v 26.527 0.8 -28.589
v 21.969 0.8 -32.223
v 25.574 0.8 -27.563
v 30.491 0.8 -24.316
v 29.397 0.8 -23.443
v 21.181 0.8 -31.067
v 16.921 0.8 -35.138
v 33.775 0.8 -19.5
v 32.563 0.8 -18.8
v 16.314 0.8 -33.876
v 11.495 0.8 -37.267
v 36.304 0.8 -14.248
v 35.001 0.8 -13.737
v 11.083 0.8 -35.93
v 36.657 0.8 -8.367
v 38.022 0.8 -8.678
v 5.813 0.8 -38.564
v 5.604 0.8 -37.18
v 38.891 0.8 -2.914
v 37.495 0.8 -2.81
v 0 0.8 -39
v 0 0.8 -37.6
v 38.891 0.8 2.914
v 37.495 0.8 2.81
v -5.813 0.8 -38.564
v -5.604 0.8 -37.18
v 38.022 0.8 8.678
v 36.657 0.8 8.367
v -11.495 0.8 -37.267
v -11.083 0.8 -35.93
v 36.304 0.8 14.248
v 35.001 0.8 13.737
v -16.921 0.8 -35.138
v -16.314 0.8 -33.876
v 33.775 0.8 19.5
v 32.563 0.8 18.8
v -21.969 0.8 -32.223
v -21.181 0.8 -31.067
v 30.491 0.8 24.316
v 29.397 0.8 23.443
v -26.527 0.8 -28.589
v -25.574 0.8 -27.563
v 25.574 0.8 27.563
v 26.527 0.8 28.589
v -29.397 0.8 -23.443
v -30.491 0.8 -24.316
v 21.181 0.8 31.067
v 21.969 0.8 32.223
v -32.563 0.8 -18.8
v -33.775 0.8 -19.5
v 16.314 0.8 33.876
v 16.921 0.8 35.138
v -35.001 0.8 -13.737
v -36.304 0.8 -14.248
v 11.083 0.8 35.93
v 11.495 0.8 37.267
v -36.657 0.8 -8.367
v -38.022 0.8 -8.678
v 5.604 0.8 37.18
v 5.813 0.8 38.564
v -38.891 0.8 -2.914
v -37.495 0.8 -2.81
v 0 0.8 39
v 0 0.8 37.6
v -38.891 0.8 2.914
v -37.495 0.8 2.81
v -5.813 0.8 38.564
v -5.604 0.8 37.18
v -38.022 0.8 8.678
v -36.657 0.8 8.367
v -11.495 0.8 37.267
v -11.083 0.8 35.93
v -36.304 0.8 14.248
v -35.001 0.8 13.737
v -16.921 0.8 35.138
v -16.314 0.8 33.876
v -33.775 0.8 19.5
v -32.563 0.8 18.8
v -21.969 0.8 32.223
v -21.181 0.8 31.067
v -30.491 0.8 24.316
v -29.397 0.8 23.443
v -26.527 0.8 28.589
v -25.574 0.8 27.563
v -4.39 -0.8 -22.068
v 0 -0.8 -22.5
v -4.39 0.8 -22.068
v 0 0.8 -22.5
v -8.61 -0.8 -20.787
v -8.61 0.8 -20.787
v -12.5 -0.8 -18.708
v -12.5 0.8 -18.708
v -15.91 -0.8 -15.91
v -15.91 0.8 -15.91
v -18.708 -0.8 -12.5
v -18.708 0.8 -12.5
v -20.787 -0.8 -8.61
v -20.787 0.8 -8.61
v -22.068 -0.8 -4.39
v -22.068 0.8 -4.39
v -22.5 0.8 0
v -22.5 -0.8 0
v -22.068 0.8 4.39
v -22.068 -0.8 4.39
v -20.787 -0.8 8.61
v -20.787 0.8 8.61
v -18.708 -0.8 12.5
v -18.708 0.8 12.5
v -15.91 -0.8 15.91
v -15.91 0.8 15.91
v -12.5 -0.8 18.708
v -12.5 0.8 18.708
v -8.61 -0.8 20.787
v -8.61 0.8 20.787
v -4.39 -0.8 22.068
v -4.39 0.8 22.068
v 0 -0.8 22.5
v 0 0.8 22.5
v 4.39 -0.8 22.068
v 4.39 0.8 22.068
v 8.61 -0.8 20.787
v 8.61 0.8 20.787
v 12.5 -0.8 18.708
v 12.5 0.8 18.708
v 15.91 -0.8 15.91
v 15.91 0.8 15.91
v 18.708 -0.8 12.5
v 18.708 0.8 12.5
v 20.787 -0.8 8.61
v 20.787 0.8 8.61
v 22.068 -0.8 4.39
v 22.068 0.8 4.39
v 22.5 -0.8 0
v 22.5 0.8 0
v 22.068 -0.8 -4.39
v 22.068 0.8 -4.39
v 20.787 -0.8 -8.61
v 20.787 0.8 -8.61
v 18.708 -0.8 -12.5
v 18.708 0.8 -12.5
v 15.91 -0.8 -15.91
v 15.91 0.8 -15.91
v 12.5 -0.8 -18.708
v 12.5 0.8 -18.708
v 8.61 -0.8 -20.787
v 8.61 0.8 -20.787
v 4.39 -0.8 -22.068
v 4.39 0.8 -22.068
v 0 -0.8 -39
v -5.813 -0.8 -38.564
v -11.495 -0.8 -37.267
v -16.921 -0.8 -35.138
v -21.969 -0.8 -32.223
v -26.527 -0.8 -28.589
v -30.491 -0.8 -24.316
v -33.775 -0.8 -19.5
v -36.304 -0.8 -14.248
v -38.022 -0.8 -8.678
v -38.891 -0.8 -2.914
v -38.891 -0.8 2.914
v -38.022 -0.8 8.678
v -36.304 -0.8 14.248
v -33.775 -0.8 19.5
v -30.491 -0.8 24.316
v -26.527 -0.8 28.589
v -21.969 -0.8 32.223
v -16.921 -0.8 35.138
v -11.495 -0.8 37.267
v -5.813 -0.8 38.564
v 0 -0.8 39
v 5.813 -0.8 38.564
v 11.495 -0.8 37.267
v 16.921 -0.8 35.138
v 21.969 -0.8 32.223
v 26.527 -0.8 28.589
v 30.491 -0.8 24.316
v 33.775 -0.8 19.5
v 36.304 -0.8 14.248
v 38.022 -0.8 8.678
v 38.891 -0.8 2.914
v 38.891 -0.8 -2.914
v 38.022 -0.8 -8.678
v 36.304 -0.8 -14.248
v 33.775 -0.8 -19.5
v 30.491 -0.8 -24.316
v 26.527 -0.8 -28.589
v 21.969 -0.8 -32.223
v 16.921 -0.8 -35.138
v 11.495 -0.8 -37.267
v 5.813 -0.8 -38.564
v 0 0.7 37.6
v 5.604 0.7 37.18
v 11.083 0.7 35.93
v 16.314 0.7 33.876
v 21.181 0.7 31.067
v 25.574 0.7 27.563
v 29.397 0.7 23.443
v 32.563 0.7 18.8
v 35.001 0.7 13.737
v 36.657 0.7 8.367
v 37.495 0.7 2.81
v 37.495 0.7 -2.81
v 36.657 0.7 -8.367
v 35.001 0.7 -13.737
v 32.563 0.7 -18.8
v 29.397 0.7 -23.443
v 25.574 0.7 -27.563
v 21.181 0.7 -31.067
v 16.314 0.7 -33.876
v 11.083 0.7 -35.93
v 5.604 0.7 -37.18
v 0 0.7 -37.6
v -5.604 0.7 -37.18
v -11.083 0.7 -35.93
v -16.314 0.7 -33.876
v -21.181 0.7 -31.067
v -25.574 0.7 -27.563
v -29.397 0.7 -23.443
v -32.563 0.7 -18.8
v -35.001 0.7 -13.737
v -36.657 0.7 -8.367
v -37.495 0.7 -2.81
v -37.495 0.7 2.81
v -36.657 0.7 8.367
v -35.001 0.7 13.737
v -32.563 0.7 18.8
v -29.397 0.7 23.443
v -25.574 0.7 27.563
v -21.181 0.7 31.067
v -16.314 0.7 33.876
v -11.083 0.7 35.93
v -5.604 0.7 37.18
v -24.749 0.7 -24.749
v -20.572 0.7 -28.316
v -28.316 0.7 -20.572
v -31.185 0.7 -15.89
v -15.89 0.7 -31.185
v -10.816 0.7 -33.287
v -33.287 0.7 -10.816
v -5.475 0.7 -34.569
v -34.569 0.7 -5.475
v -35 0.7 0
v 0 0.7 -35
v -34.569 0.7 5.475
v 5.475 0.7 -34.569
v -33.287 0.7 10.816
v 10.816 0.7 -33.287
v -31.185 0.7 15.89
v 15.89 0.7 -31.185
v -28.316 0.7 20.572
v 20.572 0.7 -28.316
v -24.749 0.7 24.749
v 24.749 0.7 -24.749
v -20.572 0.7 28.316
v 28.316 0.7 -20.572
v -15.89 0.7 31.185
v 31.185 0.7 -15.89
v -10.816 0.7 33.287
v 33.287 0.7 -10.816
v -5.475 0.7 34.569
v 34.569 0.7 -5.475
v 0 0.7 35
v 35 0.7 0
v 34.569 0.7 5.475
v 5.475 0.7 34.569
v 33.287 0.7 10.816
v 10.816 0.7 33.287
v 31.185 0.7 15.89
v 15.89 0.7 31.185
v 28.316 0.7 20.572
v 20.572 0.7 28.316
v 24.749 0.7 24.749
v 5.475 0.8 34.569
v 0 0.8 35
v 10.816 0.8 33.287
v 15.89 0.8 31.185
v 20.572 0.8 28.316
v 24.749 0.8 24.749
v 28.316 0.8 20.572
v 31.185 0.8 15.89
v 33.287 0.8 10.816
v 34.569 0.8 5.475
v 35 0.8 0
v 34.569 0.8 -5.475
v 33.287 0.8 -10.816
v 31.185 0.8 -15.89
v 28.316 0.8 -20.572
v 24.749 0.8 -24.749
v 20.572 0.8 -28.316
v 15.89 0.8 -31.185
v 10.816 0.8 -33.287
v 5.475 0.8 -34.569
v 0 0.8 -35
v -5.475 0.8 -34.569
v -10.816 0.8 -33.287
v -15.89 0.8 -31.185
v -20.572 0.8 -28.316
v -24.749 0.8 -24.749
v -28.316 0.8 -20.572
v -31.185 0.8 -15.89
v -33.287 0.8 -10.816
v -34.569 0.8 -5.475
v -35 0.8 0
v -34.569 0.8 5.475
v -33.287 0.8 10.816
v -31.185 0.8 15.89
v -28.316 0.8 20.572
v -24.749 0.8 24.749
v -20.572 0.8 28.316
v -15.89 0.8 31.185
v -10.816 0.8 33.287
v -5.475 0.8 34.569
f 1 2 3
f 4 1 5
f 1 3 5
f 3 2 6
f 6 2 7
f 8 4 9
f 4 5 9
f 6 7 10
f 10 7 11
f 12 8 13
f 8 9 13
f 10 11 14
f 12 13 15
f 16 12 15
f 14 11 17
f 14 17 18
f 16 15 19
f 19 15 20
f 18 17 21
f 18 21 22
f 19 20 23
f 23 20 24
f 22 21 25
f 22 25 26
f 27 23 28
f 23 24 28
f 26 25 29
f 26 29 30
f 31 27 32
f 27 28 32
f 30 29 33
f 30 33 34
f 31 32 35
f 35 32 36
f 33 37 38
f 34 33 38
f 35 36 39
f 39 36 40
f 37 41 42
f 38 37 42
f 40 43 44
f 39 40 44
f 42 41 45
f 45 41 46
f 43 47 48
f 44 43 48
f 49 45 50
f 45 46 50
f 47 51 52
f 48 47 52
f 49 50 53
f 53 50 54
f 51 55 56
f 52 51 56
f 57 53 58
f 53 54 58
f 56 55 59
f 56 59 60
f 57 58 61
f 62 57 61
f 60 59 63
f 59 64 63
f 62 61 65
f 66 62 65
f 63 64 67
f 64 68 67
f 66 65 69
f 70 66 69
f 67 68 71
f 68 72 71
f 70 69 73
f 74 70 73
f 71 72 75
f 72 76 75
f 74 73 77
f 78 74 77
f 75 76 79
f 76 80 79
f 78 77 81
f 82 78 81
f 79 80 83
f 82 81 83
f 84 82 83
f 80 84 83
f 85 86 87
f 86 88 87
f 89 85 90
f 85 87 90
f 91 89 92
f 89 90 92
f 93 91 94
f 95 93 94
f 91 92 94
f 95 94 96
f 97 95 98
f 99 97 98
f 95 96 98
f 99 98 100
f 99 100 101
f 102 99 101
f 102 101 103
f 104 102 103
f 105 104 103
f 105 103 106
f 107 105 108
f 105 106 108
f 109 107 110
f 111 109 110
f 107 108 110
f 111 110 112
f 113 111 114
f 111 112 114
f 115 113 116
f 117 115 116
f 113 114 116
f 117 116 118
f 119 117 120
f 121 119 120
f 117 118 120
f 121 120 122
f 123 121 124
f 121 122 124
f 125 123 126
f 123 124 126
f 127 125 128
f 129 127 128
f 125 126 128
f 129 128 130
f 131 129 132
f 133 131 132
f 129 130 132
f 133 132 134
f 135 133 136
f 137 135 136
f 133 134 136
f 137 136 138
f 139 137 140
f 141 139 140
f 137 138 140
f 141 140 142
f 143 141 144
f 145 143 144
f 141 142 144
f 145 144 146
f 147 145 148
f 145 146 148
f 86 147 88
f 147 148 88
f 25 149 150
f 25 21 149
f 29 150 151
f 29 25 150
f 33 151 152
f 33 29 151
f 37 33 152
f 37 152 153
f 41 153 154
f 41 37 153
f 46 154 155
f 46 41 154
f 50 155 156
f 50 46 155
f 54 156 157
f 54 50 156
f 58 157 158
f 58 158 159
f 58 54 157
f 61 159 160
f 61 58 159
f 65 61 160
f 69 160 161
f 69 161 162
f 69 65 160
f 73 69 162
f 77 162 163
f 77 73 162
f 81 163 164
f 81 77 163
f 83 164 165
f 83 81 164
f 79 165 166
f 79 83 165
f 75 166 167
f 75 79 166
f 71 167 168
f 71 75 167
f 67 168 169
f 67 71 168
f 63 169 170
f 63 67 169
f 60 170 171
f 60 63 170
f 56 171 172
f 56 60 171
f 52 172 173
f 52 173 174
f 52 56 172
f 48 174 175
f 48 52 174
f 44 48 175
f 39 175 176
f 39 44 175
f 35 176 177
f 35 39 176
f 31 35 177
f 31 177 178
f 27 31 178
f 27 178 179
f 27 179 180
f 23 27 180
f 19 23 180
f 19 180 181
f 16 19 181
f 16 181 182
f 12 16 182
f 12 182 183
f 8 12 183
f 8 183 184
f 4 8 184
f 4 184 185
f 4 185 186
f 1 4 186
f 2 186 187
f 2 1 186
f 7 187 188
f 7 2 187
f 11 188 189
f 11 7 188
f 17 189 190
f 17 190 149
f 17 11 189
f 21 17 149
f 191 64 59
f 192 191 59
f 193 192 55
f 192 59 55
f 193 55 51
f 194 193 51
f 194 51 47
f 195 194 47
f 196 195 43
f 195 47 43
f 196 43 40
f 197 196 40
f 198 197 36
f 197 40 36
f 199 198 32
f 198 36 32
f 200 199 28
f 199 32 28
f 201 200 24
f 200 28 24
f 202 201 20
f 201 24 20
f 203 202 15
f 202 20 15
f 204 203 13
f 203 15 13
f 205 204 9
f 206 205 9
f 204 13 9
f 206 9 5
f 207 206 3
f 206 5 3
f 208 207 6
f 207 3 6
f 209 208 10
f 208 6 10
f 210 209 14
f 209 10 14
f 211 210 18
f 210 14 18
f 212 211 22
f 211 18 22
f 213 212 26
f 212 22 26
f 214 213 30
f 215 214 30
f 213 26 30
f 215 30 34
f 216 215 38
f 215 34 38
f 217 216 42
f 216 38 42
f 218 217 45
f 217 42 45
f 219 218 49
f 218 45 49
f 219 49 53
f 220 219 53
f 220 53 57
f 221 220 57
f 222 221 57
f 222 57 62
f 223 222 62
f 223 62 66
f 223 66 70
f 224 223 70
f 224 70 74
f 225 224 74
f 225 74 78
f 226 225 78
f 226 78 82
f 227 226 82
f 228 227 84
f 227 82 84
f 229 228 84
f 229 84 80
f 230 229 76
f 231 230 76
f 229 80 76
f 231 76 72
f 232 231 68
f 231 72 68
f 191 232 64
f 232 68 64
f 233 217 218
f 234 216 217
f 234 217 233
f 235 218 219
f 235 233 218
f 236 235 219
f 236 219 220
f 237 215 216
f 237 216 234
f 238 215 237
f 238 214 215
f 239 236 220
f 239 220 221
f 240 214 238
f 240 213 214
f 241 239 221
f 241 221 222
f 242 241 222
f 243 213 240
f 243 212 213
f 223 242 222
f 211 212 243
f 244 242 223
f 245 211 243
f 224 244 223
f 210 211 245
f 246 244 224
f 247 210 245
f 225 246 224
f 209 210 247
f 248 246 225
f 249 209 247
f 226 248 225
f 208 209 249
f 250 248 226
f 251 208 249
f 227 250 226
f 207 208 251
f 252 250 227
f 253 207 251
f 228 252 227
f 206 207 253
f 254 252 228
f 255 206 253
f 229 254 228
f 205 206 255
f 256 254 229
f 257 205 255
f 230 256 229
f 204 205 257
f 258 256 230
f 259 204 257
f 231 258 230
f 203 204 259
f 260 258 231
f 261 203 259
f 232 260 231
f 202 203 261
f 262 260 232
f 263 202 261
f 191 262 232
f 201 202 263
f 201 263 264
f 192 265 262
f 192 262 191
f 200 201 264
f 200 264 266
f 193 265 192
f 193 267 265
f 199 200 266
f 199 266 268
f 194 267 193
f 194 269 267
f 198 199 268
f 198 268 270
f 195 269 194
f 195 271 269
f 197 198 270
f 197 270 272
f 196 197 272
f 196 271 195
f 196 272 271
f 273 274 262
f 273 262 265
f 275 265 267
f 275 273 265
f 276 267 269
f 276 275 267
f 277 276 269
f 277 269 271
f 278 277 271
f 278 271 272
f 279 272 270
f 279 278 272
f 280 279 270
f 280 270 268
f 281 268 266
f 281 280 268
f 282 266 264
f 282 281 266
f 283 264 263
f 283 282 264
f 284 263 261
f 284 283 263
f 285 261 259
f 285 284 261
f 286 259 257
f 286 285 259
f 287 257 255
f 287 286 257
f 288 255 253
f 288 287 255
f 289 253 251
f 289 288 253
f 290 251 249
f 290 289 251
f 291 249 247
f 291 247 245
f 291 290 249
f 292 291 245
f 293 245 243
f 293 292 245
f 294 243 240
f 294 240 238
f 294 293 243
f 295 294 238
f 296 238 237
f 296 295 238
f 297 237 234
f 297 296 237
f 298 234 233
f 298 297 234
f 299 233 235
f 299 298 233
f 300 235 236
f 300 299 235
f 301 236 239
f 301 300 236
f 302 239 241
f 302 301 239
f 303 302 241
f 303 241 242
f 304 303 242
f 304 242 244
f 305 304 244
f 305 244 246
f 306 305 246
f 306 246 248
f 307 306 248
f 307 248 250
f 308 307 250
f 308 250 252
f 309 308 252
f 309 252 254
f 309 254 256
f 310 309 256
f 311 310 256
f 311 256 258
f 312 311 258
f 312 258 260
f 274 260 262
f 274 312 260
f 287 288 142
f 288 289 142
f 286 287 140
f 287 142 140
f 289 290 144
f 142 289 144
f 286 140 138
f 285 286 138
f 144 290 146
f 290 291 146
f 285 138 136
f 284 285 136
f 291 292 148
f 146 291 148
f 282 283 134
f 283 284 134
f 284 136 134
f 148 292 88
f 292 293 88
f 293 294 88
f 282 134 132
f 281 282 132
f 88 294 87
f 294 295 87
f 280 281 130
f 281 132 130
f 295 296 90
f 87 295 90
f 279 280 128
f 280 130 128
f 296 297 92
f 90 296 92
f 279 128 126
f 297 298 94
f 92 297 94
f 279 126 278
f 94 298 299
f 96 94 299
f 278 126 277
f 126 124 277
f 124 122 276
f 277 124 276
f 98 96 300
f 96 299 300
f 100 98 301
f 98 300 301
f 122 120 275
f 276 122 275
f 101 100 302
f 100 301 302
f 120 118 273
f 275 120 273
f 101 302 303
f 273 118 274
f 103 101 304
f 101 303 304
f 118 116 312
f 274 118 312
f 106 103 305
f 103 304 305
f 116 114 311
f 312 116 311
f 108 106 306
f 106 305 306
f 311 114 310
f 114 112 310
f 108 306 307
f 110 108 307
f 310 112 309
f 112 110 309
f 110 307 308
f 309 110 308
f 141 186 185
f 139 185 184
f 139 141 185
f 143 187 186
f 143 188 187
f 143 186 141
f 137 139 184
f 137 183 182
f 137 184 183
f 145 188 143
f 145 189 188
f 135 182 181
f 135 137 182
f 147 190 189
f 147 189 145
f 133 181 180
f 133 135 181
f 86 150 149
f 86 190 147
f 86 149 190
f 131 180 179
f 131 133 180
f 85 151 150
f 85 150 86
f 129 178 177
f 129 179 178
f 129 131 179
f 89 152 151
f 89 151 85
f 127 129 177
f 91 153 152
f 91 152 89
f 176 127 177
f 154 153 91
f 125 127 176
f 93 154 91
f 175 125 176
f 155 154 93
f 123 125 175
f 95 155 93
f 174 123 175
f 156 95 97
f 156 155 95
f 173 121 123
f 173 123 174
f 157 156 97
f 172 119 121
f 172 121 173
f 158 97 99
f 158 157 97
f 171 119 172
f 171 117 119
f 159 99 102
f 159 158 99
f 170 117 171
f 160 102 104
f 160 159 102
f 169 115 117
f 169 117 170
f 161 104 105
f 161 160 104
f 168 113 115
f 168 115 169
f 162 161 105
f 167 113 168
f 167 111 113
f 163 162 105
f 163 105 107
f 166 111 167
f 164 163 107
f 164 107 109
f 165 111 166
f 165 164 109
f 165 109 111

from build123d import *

# Parameters (mm, degrees)
ESQUISSE1_W             = 16.5
ESQUISSE1_H             = 1.6
ESQUISSE2_R             = 37.6
ESQUISSE2_R_2           = 35
ENL_V_MAT_EXTRU_1_DEPTH = 0.1


with BuildPart() as part:
    # Esquisse1 → Révolution1 (revolve)
    with BuildSketch(Plane.XY, mode=Mode.PRIVATE) as r_volution1_sk:
        with Locations((30.75, 0)):
            Rectangle(ESQUISSE1_W, ESQUISSE1_H)
    revolve(r_volution1_sk.sketch.rotate(Axis((0, -15.298646519, 0), (0, 1, 0)), 90), axis=Axis((0, -15.298646519, 0), (0, 1, 0)))

    # Esquisse2 → Enlèv. mat.-Extru.1 (cut)
    with BuildSketch(Plane(origin=(0, 0.8, 0), x_dir=(1, 0, 0), z_dir=(0, 1, 0))):
        with Locations(Location((0, 0, 0), (0, 0, 270))):
            Circle(ESQUISSE2_R)
        with Locations(Location((0, 0, 0), (0, 0, 270))):
            Circle(ESQUISSE2_R_2, mode=Mode.SUBTRACT)
    extrude(amount=-ENL_V_MAT_EXTRU_1_DEPTH, mode=Mode.SUBTRACT)


solid = part.part
